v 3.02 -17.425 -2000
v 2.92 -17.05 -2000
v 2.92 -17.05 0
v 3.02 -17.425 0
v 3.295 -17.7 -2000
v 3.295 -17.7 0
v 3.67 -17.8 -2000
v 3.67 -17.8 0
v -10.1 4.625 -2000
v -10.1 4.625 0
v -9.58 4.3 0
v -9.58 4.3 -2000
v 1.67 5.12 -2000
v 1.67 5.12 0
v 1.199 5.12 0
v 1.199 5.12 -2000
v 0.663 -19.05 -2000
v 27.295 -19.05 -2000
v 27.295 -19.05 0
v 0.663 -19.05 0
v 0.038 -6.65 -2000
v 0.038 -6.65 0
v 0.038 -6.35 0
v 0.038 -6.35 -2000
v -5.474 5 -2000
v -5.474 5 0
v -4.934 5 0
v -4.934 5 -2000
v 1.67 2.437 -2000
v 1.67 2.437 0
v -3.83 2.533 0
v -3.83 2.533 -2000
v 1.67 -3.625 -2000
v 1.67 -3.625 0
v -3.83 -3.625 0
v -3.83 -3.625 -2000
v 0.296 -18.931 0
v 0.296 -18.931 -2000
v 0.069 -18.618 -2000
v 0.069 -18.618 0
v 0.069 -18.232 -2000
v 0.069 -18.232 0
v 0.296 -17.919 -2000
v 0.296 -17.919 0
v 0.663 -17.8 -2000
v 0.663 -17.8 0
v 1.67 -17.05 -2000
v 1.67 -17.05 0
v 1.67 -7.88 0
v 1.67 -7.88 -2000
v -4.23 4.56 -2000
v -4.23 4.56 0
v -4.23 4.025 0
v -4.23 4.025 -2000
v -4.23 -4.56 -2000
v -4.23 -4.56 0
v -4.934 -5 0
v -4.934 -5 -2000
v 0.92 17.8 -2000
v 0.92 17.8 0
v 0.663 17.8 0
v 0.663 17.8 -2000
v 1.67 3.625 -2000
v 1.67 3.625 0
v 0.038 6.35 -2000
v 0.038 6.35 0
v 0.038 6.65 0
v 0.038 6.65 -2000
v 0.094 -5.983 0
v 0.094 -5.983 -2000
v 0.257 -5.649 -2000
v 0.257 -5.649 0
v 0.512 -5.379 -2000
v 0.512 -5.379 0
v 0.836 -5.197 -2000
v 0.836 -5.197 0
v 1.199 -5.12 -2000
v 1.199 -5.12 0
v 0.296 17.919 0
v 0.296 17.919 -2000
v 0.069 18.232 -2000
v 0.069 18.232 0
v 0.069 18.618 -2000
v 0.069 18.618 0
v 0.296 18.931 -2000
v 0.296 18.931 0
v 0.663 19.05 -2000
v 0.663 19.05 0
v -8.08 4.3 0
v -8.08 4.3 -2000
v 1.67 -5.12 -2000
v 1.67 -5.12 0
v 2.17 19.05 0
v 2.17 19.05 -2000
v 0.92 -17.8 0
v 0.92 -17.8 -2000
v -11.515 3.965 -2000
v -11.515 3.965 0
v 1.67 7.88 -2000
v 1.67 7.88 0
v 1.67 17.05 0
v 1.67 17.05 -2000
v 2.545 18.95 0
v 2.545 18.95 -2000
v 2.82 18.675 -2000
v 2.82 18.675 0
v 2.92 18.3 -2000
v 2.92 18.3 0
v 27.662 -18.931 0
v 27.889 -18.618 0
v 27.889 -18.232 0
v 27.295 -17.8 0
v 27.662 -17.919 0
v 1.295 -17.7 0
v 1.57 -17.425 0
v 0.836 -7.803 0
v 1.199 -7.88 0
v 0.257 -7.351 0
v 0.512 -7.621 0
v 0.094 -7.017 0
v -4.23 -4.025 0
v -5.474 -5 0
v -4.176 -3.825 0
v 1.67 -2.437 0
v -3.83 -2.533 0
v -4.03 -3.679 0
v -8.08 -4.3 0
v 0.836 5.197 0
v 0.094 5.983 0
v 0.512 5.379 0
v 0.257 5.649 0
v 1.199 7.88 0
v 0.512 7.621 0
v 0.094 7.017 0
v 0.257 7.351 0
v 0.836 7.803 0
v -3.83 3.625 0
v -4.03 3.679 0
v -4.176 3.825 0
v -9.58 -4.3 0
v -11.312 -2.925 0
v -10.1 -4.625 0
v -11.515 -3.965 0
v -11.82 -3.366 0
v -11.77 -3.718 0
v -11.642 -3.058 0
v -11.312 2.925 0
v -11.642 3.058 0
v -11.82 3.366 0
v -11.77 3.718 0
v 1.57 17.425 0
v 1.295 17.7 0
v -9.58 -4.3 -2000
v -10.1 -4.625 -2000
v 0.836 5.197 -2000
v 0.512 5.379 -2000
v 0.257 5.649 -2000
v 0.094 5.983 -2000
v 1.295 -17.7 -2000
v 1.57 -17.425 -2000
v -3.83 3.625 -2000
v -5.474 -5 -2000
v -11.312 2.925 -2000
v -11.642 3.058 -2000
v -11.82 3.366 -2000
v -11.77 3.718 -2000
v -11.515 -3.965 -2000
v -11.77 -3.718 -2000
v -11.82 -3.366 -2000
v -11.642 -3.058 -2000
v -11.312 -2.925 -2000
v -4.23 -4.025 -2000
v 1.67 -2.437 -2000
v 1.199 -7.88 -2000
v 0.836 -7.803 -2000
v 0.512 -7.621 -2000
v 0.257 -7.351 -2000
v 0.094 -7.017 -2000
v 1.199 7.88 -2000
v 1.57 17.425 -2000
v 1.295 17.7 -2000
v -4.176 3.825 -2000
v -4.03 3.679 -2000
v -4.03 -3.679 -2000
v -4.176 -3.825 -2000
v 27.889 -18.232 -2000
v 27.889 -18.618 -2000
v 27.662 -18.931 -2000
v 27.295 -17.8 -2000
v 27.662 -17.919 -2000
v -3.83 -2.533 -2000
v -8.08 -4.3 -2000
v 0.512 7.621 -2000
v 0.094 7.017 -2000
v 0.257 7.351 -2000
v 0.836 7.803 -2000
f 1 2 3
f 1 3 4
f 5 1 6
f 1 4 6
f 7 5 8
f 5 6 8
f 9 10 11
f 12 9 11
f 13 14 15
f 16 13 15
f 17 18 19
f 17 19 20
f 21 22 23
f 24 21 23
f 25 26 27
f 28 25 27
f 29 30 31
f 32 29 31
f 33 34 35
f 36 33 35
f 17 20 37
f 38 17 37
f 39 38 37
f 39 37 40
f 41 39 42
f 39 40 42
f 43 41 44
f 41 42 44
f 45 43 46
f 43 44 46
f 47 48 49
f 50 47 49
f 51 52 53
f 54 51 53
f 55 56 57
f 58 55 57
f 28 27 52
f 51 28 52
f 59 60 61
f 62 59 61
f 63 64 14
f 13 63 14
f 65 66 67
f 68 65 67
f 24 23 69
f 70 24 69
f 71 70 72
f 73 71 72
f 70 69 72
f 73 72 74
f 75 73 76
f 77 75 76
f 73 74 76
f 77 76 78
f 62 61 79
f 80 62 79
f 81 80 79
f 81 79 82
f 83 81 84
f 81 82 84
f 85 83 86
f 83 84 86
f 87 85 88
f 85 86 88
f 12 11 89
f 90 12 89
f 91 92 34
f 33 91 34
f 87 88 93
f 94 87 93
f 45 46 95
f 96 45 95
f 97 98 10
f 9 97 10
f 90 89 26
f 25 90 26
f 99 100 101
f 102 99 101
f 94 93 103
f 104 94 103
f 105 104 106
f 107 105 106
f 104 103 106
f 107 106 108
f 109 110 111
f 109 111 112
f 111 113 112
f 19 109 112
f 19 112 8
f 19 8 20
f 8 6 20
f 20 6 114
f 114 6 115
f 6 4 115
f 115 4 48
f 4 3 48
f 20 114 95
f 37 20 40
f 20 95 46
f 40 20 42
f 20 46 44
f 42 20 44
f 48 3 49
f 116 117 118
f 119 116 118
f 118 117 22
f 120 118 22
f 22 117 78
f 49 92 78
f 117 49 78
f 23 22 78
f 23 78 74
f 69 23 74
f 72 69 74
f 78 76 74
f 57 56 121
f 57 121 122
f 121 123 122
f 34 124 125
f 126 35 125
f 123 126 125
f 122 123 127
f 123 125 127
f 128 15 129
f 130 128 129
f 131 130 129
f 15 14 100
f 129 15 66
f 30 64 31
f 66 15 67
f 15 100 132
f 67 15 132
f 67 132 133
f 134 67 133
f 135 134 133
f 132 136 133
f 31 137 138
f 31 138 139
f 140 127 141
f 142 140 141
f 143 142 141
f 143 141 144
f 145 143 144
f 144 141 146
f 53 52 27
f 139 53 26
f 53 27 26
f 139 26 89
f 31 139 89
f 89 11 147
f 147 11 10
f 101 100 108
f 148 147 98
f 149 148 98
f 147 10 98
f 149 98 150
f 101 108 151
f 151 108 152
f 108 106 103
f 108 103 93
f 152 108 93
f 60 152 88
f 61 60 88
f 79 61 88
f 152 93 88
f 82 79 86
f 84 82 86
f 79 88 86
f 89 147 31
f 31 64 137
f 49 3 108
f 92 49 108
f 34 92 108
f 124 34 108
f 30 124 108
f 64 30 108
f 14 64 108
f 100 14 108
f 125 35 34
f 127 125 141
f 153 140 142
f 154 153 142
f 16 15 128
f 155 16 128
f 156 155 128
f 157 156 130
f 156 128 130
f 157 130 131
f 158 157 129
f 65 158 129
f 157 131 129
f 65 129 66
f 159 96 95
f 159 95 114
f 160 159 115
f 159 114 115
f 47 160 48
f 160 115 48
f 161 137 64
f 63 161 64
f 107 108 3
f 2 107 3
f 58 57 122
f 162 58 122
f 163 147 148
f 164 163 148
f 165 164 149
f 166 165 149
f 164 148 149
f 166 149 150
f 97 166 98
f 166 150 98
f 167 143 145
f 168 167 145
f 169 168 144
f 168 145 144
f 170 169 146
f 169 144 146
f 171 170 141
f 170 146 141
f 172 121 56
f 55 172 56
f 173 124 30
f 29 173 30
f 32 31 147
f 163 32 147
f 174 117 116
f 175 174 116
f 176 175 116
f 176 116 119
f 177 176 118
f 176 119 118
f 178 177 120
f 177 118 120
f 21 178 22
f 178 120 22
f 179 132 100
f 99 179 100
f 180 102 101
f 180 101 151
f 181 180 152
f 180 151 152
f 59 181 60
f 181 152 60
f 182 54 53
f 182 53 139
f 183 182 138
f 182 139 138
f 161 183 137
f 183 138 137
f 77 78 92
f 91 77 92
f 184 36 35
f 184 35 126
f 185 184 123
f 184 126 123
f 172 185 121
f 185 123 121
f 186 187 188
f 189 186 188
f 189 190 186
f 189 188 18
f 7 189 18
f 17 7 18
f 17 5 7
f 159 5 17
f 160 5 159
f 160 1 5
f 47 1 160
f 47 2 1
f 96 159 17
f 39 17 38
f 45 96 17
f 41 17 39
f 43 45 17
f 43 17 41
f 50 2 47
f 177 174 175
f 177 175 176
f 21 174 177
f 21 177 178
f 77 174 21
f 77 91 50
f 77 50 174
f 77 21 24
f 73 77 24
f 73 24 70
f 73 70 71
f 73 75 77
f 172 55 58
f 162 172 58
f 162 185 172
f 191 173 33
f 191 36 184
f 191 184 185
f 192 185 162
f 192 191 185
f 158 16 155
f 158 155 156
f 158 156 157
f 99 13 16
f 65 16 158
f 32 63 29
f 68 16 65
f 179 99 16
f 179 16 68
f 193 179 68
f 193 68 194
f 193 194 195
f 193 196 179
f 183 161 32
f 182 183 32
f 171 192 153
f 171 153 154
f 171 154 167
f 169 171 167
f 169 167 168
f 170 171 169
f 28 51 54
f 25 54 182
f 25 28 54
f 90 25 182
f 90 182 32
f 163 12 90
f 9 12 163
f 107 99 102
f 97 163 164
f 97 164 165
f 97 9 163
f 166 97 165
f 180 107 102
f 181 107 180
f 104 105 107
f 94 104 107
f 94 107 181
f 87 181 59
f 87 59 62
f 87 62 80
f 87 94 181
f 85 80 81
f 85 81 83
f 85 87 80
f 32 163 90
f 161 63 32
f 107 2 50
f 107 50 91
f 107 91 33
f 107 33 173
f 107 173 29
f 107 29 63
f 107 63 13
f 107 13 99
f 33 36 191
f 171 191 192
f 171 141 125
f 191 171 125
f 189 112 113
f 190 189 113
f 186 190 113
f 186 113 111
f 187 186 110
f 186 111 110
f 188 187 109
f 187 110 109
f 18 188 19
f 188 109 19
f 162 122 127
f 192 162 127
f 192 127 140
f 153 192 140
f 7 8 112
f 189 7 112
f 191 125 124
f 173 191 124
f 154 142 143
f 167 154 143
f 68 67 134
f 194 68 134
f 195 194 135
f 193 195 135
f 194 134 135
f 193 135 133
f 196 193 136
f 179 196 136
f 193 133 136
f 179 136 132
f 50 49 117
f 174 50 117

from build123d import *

# Parameters (mm, degrees)
MAIN_EXTRUSION_DEPTH = 2000


with BuildPart() as part:
    # Sk Main Extrusion → Main Extrusion (new body)
    with BuildSketch(Plane.XY):
        with BuildLine():
            Line((-3.829999995, 2.532800268), (-11.312491547, 2.92508363))
            ThreePointArc((-11.312491547, 2.92508363), (-11.819968112, 3.366238977), (-11.514692349, 3.965369358))
            Line((-11.514692349, 3.965369358), (-10.100108722, 4.625000536))
            Line((-10.100108722, 4.625000536), (-9.58, 4.300000536))
            Line((-9.58, 4.300000536), (-8.08, 4.300000536))
            Line((-8.08, 4.300000536), (-5.474147193, 5.000000536))
            Line((-5.474147193, 5.000000536), (-4.934147193, 5.000000536))
            Line((-4.934147193, 5.000000536), (-4.23, 4.56))
            Line((-4.23, 4.56), (-4.23, 4.025000268))
            ThreePointArc((-4.23, 4.025000268), (-4.112842712, 3.742157556), (-3.83, 3.625000268))
            Line((-3.83, 3.625000268), (1.67, 3.625000268))
            Line((1.67, 3.625000268), (1.67, 5.120055436))
            Line((1.67, 5.120055436), (1.19886836, 5.120055436))
            ThreePointArc((1.19886836, 5.120055436), (0.3740485, 5.504367422), (0.038, 6.350000268))
            Line((0.038, 6.350000268), (0.038, 6.650000268))
            ThreePointArc((0.038, 6.650000268), (0.3740485, 7.495633114), (1.19886836, 7.8799451))
            Line((1.19886836, 7.8799451), (1.67, 7.8799451))
            Line((1.67, 7.8799451), (1.67, 17.050000268))
            ThreePointArc((1.67, 17.050000268), (1.450330086, 17.580330354), (0.92, 17.800000268))
            Line((0.92, 17.800000268), (0.663, 17.800000268))
            ThreePointArc((0.663, 17.800000268), (0.038, 18.425000268), (0.663, 19.050000268))
            Line((0.663, 19.050000268), (2.17, 19.050000268))
            ThreePointArc((2.17, 19.050000268), (2.700330086, 18.830330354), (2.92, 18.300000268))
            Line((2.92, 18.300000268), (2.92, -17.049999732))
            ThreePointArc((2.92, -17.049999732), (3.139669914, -17.580329818), (3.67, -17.799999732))
            Line((3.67, -17.799999732), (27.295, -17.799999732))
            ThreePointArc((27.295, -17.799999732), (27.92, -18.424999732), (27.295, -19.049999732))
            Line((27.295, -19.049999732), (0.663, -19.049999732))
            ThreePointArc((0.663, -19.049999732), (0.038, -18.424999732), (0.663, -17.799999732))
            Line((0.663, -17.799999732), (0.92, -17.799999732))
            ThreePointArc((0.92, -17.799999732), (1.450330086, -17.580329818), (1.67, -17.049999732))
            Line((1.67, -17.049999732), (1.67, -7.879944832))
            Line((1.67, -7.879944832), (1.19886836, -7.879944832))
            ThreePointArc((1.19886836, -7.879944832), (0.3740485, -7.495632846), (0.038, -6.65))
            Line((0.038, -6.65), (0.038, -6.35))
            ThreePointArc((0.038, -6.35), (0.3740485, -5.504367154), (1.19886836, -5.120055168))
            Line((1.19886836, -5.120055168), (1.67, -5.120055168))
            Line((1.67, -5.120055168), (1.67, -3.625))
            Line((1.67, -3.625), (-3.83, -3.625))
            ThreePointArc((-3.83, -3.625), (-4.112842712, -3.742157288), (-4.23, -4.025))
            Line((-4.23, -4.025), (-4.23, -4.56))
            Line((-4.23, -4.56), (-4.934147193, -5))
            Line((-4.934147193, -5), (-5.474147193, -5))
            Line((-5.474147193, -5), (-8.08, -4.3))
            Line((-8.08, -4.3), (-9.58, -4.3))
            Line((-9.58, -4.3), (-10.100108722, -4.625))
            Line((-10.100108722, -4.625), (-11.51469235, -3.965368821))
            ThreePointArc((-11.51469235, -3.965368821), (-11.819968112, -3.36623844), (-11.312491547, -2.925083093))
            Line((-11.312491547, -2.925083093), (-3.830000005, -2.532799732))
            Line((-3.830000005, -2.532799732), (1.67, -2.436796875))
            Line((1.67, -2.436796875), (1.67, 2.436797411))
            Line((1.67, 2.436797411), (-3.829999995, 2.532800268))
        make_face()
    extrude(amount=-MAIN_EXTRUSION_DEPTH)


solid = part.part
